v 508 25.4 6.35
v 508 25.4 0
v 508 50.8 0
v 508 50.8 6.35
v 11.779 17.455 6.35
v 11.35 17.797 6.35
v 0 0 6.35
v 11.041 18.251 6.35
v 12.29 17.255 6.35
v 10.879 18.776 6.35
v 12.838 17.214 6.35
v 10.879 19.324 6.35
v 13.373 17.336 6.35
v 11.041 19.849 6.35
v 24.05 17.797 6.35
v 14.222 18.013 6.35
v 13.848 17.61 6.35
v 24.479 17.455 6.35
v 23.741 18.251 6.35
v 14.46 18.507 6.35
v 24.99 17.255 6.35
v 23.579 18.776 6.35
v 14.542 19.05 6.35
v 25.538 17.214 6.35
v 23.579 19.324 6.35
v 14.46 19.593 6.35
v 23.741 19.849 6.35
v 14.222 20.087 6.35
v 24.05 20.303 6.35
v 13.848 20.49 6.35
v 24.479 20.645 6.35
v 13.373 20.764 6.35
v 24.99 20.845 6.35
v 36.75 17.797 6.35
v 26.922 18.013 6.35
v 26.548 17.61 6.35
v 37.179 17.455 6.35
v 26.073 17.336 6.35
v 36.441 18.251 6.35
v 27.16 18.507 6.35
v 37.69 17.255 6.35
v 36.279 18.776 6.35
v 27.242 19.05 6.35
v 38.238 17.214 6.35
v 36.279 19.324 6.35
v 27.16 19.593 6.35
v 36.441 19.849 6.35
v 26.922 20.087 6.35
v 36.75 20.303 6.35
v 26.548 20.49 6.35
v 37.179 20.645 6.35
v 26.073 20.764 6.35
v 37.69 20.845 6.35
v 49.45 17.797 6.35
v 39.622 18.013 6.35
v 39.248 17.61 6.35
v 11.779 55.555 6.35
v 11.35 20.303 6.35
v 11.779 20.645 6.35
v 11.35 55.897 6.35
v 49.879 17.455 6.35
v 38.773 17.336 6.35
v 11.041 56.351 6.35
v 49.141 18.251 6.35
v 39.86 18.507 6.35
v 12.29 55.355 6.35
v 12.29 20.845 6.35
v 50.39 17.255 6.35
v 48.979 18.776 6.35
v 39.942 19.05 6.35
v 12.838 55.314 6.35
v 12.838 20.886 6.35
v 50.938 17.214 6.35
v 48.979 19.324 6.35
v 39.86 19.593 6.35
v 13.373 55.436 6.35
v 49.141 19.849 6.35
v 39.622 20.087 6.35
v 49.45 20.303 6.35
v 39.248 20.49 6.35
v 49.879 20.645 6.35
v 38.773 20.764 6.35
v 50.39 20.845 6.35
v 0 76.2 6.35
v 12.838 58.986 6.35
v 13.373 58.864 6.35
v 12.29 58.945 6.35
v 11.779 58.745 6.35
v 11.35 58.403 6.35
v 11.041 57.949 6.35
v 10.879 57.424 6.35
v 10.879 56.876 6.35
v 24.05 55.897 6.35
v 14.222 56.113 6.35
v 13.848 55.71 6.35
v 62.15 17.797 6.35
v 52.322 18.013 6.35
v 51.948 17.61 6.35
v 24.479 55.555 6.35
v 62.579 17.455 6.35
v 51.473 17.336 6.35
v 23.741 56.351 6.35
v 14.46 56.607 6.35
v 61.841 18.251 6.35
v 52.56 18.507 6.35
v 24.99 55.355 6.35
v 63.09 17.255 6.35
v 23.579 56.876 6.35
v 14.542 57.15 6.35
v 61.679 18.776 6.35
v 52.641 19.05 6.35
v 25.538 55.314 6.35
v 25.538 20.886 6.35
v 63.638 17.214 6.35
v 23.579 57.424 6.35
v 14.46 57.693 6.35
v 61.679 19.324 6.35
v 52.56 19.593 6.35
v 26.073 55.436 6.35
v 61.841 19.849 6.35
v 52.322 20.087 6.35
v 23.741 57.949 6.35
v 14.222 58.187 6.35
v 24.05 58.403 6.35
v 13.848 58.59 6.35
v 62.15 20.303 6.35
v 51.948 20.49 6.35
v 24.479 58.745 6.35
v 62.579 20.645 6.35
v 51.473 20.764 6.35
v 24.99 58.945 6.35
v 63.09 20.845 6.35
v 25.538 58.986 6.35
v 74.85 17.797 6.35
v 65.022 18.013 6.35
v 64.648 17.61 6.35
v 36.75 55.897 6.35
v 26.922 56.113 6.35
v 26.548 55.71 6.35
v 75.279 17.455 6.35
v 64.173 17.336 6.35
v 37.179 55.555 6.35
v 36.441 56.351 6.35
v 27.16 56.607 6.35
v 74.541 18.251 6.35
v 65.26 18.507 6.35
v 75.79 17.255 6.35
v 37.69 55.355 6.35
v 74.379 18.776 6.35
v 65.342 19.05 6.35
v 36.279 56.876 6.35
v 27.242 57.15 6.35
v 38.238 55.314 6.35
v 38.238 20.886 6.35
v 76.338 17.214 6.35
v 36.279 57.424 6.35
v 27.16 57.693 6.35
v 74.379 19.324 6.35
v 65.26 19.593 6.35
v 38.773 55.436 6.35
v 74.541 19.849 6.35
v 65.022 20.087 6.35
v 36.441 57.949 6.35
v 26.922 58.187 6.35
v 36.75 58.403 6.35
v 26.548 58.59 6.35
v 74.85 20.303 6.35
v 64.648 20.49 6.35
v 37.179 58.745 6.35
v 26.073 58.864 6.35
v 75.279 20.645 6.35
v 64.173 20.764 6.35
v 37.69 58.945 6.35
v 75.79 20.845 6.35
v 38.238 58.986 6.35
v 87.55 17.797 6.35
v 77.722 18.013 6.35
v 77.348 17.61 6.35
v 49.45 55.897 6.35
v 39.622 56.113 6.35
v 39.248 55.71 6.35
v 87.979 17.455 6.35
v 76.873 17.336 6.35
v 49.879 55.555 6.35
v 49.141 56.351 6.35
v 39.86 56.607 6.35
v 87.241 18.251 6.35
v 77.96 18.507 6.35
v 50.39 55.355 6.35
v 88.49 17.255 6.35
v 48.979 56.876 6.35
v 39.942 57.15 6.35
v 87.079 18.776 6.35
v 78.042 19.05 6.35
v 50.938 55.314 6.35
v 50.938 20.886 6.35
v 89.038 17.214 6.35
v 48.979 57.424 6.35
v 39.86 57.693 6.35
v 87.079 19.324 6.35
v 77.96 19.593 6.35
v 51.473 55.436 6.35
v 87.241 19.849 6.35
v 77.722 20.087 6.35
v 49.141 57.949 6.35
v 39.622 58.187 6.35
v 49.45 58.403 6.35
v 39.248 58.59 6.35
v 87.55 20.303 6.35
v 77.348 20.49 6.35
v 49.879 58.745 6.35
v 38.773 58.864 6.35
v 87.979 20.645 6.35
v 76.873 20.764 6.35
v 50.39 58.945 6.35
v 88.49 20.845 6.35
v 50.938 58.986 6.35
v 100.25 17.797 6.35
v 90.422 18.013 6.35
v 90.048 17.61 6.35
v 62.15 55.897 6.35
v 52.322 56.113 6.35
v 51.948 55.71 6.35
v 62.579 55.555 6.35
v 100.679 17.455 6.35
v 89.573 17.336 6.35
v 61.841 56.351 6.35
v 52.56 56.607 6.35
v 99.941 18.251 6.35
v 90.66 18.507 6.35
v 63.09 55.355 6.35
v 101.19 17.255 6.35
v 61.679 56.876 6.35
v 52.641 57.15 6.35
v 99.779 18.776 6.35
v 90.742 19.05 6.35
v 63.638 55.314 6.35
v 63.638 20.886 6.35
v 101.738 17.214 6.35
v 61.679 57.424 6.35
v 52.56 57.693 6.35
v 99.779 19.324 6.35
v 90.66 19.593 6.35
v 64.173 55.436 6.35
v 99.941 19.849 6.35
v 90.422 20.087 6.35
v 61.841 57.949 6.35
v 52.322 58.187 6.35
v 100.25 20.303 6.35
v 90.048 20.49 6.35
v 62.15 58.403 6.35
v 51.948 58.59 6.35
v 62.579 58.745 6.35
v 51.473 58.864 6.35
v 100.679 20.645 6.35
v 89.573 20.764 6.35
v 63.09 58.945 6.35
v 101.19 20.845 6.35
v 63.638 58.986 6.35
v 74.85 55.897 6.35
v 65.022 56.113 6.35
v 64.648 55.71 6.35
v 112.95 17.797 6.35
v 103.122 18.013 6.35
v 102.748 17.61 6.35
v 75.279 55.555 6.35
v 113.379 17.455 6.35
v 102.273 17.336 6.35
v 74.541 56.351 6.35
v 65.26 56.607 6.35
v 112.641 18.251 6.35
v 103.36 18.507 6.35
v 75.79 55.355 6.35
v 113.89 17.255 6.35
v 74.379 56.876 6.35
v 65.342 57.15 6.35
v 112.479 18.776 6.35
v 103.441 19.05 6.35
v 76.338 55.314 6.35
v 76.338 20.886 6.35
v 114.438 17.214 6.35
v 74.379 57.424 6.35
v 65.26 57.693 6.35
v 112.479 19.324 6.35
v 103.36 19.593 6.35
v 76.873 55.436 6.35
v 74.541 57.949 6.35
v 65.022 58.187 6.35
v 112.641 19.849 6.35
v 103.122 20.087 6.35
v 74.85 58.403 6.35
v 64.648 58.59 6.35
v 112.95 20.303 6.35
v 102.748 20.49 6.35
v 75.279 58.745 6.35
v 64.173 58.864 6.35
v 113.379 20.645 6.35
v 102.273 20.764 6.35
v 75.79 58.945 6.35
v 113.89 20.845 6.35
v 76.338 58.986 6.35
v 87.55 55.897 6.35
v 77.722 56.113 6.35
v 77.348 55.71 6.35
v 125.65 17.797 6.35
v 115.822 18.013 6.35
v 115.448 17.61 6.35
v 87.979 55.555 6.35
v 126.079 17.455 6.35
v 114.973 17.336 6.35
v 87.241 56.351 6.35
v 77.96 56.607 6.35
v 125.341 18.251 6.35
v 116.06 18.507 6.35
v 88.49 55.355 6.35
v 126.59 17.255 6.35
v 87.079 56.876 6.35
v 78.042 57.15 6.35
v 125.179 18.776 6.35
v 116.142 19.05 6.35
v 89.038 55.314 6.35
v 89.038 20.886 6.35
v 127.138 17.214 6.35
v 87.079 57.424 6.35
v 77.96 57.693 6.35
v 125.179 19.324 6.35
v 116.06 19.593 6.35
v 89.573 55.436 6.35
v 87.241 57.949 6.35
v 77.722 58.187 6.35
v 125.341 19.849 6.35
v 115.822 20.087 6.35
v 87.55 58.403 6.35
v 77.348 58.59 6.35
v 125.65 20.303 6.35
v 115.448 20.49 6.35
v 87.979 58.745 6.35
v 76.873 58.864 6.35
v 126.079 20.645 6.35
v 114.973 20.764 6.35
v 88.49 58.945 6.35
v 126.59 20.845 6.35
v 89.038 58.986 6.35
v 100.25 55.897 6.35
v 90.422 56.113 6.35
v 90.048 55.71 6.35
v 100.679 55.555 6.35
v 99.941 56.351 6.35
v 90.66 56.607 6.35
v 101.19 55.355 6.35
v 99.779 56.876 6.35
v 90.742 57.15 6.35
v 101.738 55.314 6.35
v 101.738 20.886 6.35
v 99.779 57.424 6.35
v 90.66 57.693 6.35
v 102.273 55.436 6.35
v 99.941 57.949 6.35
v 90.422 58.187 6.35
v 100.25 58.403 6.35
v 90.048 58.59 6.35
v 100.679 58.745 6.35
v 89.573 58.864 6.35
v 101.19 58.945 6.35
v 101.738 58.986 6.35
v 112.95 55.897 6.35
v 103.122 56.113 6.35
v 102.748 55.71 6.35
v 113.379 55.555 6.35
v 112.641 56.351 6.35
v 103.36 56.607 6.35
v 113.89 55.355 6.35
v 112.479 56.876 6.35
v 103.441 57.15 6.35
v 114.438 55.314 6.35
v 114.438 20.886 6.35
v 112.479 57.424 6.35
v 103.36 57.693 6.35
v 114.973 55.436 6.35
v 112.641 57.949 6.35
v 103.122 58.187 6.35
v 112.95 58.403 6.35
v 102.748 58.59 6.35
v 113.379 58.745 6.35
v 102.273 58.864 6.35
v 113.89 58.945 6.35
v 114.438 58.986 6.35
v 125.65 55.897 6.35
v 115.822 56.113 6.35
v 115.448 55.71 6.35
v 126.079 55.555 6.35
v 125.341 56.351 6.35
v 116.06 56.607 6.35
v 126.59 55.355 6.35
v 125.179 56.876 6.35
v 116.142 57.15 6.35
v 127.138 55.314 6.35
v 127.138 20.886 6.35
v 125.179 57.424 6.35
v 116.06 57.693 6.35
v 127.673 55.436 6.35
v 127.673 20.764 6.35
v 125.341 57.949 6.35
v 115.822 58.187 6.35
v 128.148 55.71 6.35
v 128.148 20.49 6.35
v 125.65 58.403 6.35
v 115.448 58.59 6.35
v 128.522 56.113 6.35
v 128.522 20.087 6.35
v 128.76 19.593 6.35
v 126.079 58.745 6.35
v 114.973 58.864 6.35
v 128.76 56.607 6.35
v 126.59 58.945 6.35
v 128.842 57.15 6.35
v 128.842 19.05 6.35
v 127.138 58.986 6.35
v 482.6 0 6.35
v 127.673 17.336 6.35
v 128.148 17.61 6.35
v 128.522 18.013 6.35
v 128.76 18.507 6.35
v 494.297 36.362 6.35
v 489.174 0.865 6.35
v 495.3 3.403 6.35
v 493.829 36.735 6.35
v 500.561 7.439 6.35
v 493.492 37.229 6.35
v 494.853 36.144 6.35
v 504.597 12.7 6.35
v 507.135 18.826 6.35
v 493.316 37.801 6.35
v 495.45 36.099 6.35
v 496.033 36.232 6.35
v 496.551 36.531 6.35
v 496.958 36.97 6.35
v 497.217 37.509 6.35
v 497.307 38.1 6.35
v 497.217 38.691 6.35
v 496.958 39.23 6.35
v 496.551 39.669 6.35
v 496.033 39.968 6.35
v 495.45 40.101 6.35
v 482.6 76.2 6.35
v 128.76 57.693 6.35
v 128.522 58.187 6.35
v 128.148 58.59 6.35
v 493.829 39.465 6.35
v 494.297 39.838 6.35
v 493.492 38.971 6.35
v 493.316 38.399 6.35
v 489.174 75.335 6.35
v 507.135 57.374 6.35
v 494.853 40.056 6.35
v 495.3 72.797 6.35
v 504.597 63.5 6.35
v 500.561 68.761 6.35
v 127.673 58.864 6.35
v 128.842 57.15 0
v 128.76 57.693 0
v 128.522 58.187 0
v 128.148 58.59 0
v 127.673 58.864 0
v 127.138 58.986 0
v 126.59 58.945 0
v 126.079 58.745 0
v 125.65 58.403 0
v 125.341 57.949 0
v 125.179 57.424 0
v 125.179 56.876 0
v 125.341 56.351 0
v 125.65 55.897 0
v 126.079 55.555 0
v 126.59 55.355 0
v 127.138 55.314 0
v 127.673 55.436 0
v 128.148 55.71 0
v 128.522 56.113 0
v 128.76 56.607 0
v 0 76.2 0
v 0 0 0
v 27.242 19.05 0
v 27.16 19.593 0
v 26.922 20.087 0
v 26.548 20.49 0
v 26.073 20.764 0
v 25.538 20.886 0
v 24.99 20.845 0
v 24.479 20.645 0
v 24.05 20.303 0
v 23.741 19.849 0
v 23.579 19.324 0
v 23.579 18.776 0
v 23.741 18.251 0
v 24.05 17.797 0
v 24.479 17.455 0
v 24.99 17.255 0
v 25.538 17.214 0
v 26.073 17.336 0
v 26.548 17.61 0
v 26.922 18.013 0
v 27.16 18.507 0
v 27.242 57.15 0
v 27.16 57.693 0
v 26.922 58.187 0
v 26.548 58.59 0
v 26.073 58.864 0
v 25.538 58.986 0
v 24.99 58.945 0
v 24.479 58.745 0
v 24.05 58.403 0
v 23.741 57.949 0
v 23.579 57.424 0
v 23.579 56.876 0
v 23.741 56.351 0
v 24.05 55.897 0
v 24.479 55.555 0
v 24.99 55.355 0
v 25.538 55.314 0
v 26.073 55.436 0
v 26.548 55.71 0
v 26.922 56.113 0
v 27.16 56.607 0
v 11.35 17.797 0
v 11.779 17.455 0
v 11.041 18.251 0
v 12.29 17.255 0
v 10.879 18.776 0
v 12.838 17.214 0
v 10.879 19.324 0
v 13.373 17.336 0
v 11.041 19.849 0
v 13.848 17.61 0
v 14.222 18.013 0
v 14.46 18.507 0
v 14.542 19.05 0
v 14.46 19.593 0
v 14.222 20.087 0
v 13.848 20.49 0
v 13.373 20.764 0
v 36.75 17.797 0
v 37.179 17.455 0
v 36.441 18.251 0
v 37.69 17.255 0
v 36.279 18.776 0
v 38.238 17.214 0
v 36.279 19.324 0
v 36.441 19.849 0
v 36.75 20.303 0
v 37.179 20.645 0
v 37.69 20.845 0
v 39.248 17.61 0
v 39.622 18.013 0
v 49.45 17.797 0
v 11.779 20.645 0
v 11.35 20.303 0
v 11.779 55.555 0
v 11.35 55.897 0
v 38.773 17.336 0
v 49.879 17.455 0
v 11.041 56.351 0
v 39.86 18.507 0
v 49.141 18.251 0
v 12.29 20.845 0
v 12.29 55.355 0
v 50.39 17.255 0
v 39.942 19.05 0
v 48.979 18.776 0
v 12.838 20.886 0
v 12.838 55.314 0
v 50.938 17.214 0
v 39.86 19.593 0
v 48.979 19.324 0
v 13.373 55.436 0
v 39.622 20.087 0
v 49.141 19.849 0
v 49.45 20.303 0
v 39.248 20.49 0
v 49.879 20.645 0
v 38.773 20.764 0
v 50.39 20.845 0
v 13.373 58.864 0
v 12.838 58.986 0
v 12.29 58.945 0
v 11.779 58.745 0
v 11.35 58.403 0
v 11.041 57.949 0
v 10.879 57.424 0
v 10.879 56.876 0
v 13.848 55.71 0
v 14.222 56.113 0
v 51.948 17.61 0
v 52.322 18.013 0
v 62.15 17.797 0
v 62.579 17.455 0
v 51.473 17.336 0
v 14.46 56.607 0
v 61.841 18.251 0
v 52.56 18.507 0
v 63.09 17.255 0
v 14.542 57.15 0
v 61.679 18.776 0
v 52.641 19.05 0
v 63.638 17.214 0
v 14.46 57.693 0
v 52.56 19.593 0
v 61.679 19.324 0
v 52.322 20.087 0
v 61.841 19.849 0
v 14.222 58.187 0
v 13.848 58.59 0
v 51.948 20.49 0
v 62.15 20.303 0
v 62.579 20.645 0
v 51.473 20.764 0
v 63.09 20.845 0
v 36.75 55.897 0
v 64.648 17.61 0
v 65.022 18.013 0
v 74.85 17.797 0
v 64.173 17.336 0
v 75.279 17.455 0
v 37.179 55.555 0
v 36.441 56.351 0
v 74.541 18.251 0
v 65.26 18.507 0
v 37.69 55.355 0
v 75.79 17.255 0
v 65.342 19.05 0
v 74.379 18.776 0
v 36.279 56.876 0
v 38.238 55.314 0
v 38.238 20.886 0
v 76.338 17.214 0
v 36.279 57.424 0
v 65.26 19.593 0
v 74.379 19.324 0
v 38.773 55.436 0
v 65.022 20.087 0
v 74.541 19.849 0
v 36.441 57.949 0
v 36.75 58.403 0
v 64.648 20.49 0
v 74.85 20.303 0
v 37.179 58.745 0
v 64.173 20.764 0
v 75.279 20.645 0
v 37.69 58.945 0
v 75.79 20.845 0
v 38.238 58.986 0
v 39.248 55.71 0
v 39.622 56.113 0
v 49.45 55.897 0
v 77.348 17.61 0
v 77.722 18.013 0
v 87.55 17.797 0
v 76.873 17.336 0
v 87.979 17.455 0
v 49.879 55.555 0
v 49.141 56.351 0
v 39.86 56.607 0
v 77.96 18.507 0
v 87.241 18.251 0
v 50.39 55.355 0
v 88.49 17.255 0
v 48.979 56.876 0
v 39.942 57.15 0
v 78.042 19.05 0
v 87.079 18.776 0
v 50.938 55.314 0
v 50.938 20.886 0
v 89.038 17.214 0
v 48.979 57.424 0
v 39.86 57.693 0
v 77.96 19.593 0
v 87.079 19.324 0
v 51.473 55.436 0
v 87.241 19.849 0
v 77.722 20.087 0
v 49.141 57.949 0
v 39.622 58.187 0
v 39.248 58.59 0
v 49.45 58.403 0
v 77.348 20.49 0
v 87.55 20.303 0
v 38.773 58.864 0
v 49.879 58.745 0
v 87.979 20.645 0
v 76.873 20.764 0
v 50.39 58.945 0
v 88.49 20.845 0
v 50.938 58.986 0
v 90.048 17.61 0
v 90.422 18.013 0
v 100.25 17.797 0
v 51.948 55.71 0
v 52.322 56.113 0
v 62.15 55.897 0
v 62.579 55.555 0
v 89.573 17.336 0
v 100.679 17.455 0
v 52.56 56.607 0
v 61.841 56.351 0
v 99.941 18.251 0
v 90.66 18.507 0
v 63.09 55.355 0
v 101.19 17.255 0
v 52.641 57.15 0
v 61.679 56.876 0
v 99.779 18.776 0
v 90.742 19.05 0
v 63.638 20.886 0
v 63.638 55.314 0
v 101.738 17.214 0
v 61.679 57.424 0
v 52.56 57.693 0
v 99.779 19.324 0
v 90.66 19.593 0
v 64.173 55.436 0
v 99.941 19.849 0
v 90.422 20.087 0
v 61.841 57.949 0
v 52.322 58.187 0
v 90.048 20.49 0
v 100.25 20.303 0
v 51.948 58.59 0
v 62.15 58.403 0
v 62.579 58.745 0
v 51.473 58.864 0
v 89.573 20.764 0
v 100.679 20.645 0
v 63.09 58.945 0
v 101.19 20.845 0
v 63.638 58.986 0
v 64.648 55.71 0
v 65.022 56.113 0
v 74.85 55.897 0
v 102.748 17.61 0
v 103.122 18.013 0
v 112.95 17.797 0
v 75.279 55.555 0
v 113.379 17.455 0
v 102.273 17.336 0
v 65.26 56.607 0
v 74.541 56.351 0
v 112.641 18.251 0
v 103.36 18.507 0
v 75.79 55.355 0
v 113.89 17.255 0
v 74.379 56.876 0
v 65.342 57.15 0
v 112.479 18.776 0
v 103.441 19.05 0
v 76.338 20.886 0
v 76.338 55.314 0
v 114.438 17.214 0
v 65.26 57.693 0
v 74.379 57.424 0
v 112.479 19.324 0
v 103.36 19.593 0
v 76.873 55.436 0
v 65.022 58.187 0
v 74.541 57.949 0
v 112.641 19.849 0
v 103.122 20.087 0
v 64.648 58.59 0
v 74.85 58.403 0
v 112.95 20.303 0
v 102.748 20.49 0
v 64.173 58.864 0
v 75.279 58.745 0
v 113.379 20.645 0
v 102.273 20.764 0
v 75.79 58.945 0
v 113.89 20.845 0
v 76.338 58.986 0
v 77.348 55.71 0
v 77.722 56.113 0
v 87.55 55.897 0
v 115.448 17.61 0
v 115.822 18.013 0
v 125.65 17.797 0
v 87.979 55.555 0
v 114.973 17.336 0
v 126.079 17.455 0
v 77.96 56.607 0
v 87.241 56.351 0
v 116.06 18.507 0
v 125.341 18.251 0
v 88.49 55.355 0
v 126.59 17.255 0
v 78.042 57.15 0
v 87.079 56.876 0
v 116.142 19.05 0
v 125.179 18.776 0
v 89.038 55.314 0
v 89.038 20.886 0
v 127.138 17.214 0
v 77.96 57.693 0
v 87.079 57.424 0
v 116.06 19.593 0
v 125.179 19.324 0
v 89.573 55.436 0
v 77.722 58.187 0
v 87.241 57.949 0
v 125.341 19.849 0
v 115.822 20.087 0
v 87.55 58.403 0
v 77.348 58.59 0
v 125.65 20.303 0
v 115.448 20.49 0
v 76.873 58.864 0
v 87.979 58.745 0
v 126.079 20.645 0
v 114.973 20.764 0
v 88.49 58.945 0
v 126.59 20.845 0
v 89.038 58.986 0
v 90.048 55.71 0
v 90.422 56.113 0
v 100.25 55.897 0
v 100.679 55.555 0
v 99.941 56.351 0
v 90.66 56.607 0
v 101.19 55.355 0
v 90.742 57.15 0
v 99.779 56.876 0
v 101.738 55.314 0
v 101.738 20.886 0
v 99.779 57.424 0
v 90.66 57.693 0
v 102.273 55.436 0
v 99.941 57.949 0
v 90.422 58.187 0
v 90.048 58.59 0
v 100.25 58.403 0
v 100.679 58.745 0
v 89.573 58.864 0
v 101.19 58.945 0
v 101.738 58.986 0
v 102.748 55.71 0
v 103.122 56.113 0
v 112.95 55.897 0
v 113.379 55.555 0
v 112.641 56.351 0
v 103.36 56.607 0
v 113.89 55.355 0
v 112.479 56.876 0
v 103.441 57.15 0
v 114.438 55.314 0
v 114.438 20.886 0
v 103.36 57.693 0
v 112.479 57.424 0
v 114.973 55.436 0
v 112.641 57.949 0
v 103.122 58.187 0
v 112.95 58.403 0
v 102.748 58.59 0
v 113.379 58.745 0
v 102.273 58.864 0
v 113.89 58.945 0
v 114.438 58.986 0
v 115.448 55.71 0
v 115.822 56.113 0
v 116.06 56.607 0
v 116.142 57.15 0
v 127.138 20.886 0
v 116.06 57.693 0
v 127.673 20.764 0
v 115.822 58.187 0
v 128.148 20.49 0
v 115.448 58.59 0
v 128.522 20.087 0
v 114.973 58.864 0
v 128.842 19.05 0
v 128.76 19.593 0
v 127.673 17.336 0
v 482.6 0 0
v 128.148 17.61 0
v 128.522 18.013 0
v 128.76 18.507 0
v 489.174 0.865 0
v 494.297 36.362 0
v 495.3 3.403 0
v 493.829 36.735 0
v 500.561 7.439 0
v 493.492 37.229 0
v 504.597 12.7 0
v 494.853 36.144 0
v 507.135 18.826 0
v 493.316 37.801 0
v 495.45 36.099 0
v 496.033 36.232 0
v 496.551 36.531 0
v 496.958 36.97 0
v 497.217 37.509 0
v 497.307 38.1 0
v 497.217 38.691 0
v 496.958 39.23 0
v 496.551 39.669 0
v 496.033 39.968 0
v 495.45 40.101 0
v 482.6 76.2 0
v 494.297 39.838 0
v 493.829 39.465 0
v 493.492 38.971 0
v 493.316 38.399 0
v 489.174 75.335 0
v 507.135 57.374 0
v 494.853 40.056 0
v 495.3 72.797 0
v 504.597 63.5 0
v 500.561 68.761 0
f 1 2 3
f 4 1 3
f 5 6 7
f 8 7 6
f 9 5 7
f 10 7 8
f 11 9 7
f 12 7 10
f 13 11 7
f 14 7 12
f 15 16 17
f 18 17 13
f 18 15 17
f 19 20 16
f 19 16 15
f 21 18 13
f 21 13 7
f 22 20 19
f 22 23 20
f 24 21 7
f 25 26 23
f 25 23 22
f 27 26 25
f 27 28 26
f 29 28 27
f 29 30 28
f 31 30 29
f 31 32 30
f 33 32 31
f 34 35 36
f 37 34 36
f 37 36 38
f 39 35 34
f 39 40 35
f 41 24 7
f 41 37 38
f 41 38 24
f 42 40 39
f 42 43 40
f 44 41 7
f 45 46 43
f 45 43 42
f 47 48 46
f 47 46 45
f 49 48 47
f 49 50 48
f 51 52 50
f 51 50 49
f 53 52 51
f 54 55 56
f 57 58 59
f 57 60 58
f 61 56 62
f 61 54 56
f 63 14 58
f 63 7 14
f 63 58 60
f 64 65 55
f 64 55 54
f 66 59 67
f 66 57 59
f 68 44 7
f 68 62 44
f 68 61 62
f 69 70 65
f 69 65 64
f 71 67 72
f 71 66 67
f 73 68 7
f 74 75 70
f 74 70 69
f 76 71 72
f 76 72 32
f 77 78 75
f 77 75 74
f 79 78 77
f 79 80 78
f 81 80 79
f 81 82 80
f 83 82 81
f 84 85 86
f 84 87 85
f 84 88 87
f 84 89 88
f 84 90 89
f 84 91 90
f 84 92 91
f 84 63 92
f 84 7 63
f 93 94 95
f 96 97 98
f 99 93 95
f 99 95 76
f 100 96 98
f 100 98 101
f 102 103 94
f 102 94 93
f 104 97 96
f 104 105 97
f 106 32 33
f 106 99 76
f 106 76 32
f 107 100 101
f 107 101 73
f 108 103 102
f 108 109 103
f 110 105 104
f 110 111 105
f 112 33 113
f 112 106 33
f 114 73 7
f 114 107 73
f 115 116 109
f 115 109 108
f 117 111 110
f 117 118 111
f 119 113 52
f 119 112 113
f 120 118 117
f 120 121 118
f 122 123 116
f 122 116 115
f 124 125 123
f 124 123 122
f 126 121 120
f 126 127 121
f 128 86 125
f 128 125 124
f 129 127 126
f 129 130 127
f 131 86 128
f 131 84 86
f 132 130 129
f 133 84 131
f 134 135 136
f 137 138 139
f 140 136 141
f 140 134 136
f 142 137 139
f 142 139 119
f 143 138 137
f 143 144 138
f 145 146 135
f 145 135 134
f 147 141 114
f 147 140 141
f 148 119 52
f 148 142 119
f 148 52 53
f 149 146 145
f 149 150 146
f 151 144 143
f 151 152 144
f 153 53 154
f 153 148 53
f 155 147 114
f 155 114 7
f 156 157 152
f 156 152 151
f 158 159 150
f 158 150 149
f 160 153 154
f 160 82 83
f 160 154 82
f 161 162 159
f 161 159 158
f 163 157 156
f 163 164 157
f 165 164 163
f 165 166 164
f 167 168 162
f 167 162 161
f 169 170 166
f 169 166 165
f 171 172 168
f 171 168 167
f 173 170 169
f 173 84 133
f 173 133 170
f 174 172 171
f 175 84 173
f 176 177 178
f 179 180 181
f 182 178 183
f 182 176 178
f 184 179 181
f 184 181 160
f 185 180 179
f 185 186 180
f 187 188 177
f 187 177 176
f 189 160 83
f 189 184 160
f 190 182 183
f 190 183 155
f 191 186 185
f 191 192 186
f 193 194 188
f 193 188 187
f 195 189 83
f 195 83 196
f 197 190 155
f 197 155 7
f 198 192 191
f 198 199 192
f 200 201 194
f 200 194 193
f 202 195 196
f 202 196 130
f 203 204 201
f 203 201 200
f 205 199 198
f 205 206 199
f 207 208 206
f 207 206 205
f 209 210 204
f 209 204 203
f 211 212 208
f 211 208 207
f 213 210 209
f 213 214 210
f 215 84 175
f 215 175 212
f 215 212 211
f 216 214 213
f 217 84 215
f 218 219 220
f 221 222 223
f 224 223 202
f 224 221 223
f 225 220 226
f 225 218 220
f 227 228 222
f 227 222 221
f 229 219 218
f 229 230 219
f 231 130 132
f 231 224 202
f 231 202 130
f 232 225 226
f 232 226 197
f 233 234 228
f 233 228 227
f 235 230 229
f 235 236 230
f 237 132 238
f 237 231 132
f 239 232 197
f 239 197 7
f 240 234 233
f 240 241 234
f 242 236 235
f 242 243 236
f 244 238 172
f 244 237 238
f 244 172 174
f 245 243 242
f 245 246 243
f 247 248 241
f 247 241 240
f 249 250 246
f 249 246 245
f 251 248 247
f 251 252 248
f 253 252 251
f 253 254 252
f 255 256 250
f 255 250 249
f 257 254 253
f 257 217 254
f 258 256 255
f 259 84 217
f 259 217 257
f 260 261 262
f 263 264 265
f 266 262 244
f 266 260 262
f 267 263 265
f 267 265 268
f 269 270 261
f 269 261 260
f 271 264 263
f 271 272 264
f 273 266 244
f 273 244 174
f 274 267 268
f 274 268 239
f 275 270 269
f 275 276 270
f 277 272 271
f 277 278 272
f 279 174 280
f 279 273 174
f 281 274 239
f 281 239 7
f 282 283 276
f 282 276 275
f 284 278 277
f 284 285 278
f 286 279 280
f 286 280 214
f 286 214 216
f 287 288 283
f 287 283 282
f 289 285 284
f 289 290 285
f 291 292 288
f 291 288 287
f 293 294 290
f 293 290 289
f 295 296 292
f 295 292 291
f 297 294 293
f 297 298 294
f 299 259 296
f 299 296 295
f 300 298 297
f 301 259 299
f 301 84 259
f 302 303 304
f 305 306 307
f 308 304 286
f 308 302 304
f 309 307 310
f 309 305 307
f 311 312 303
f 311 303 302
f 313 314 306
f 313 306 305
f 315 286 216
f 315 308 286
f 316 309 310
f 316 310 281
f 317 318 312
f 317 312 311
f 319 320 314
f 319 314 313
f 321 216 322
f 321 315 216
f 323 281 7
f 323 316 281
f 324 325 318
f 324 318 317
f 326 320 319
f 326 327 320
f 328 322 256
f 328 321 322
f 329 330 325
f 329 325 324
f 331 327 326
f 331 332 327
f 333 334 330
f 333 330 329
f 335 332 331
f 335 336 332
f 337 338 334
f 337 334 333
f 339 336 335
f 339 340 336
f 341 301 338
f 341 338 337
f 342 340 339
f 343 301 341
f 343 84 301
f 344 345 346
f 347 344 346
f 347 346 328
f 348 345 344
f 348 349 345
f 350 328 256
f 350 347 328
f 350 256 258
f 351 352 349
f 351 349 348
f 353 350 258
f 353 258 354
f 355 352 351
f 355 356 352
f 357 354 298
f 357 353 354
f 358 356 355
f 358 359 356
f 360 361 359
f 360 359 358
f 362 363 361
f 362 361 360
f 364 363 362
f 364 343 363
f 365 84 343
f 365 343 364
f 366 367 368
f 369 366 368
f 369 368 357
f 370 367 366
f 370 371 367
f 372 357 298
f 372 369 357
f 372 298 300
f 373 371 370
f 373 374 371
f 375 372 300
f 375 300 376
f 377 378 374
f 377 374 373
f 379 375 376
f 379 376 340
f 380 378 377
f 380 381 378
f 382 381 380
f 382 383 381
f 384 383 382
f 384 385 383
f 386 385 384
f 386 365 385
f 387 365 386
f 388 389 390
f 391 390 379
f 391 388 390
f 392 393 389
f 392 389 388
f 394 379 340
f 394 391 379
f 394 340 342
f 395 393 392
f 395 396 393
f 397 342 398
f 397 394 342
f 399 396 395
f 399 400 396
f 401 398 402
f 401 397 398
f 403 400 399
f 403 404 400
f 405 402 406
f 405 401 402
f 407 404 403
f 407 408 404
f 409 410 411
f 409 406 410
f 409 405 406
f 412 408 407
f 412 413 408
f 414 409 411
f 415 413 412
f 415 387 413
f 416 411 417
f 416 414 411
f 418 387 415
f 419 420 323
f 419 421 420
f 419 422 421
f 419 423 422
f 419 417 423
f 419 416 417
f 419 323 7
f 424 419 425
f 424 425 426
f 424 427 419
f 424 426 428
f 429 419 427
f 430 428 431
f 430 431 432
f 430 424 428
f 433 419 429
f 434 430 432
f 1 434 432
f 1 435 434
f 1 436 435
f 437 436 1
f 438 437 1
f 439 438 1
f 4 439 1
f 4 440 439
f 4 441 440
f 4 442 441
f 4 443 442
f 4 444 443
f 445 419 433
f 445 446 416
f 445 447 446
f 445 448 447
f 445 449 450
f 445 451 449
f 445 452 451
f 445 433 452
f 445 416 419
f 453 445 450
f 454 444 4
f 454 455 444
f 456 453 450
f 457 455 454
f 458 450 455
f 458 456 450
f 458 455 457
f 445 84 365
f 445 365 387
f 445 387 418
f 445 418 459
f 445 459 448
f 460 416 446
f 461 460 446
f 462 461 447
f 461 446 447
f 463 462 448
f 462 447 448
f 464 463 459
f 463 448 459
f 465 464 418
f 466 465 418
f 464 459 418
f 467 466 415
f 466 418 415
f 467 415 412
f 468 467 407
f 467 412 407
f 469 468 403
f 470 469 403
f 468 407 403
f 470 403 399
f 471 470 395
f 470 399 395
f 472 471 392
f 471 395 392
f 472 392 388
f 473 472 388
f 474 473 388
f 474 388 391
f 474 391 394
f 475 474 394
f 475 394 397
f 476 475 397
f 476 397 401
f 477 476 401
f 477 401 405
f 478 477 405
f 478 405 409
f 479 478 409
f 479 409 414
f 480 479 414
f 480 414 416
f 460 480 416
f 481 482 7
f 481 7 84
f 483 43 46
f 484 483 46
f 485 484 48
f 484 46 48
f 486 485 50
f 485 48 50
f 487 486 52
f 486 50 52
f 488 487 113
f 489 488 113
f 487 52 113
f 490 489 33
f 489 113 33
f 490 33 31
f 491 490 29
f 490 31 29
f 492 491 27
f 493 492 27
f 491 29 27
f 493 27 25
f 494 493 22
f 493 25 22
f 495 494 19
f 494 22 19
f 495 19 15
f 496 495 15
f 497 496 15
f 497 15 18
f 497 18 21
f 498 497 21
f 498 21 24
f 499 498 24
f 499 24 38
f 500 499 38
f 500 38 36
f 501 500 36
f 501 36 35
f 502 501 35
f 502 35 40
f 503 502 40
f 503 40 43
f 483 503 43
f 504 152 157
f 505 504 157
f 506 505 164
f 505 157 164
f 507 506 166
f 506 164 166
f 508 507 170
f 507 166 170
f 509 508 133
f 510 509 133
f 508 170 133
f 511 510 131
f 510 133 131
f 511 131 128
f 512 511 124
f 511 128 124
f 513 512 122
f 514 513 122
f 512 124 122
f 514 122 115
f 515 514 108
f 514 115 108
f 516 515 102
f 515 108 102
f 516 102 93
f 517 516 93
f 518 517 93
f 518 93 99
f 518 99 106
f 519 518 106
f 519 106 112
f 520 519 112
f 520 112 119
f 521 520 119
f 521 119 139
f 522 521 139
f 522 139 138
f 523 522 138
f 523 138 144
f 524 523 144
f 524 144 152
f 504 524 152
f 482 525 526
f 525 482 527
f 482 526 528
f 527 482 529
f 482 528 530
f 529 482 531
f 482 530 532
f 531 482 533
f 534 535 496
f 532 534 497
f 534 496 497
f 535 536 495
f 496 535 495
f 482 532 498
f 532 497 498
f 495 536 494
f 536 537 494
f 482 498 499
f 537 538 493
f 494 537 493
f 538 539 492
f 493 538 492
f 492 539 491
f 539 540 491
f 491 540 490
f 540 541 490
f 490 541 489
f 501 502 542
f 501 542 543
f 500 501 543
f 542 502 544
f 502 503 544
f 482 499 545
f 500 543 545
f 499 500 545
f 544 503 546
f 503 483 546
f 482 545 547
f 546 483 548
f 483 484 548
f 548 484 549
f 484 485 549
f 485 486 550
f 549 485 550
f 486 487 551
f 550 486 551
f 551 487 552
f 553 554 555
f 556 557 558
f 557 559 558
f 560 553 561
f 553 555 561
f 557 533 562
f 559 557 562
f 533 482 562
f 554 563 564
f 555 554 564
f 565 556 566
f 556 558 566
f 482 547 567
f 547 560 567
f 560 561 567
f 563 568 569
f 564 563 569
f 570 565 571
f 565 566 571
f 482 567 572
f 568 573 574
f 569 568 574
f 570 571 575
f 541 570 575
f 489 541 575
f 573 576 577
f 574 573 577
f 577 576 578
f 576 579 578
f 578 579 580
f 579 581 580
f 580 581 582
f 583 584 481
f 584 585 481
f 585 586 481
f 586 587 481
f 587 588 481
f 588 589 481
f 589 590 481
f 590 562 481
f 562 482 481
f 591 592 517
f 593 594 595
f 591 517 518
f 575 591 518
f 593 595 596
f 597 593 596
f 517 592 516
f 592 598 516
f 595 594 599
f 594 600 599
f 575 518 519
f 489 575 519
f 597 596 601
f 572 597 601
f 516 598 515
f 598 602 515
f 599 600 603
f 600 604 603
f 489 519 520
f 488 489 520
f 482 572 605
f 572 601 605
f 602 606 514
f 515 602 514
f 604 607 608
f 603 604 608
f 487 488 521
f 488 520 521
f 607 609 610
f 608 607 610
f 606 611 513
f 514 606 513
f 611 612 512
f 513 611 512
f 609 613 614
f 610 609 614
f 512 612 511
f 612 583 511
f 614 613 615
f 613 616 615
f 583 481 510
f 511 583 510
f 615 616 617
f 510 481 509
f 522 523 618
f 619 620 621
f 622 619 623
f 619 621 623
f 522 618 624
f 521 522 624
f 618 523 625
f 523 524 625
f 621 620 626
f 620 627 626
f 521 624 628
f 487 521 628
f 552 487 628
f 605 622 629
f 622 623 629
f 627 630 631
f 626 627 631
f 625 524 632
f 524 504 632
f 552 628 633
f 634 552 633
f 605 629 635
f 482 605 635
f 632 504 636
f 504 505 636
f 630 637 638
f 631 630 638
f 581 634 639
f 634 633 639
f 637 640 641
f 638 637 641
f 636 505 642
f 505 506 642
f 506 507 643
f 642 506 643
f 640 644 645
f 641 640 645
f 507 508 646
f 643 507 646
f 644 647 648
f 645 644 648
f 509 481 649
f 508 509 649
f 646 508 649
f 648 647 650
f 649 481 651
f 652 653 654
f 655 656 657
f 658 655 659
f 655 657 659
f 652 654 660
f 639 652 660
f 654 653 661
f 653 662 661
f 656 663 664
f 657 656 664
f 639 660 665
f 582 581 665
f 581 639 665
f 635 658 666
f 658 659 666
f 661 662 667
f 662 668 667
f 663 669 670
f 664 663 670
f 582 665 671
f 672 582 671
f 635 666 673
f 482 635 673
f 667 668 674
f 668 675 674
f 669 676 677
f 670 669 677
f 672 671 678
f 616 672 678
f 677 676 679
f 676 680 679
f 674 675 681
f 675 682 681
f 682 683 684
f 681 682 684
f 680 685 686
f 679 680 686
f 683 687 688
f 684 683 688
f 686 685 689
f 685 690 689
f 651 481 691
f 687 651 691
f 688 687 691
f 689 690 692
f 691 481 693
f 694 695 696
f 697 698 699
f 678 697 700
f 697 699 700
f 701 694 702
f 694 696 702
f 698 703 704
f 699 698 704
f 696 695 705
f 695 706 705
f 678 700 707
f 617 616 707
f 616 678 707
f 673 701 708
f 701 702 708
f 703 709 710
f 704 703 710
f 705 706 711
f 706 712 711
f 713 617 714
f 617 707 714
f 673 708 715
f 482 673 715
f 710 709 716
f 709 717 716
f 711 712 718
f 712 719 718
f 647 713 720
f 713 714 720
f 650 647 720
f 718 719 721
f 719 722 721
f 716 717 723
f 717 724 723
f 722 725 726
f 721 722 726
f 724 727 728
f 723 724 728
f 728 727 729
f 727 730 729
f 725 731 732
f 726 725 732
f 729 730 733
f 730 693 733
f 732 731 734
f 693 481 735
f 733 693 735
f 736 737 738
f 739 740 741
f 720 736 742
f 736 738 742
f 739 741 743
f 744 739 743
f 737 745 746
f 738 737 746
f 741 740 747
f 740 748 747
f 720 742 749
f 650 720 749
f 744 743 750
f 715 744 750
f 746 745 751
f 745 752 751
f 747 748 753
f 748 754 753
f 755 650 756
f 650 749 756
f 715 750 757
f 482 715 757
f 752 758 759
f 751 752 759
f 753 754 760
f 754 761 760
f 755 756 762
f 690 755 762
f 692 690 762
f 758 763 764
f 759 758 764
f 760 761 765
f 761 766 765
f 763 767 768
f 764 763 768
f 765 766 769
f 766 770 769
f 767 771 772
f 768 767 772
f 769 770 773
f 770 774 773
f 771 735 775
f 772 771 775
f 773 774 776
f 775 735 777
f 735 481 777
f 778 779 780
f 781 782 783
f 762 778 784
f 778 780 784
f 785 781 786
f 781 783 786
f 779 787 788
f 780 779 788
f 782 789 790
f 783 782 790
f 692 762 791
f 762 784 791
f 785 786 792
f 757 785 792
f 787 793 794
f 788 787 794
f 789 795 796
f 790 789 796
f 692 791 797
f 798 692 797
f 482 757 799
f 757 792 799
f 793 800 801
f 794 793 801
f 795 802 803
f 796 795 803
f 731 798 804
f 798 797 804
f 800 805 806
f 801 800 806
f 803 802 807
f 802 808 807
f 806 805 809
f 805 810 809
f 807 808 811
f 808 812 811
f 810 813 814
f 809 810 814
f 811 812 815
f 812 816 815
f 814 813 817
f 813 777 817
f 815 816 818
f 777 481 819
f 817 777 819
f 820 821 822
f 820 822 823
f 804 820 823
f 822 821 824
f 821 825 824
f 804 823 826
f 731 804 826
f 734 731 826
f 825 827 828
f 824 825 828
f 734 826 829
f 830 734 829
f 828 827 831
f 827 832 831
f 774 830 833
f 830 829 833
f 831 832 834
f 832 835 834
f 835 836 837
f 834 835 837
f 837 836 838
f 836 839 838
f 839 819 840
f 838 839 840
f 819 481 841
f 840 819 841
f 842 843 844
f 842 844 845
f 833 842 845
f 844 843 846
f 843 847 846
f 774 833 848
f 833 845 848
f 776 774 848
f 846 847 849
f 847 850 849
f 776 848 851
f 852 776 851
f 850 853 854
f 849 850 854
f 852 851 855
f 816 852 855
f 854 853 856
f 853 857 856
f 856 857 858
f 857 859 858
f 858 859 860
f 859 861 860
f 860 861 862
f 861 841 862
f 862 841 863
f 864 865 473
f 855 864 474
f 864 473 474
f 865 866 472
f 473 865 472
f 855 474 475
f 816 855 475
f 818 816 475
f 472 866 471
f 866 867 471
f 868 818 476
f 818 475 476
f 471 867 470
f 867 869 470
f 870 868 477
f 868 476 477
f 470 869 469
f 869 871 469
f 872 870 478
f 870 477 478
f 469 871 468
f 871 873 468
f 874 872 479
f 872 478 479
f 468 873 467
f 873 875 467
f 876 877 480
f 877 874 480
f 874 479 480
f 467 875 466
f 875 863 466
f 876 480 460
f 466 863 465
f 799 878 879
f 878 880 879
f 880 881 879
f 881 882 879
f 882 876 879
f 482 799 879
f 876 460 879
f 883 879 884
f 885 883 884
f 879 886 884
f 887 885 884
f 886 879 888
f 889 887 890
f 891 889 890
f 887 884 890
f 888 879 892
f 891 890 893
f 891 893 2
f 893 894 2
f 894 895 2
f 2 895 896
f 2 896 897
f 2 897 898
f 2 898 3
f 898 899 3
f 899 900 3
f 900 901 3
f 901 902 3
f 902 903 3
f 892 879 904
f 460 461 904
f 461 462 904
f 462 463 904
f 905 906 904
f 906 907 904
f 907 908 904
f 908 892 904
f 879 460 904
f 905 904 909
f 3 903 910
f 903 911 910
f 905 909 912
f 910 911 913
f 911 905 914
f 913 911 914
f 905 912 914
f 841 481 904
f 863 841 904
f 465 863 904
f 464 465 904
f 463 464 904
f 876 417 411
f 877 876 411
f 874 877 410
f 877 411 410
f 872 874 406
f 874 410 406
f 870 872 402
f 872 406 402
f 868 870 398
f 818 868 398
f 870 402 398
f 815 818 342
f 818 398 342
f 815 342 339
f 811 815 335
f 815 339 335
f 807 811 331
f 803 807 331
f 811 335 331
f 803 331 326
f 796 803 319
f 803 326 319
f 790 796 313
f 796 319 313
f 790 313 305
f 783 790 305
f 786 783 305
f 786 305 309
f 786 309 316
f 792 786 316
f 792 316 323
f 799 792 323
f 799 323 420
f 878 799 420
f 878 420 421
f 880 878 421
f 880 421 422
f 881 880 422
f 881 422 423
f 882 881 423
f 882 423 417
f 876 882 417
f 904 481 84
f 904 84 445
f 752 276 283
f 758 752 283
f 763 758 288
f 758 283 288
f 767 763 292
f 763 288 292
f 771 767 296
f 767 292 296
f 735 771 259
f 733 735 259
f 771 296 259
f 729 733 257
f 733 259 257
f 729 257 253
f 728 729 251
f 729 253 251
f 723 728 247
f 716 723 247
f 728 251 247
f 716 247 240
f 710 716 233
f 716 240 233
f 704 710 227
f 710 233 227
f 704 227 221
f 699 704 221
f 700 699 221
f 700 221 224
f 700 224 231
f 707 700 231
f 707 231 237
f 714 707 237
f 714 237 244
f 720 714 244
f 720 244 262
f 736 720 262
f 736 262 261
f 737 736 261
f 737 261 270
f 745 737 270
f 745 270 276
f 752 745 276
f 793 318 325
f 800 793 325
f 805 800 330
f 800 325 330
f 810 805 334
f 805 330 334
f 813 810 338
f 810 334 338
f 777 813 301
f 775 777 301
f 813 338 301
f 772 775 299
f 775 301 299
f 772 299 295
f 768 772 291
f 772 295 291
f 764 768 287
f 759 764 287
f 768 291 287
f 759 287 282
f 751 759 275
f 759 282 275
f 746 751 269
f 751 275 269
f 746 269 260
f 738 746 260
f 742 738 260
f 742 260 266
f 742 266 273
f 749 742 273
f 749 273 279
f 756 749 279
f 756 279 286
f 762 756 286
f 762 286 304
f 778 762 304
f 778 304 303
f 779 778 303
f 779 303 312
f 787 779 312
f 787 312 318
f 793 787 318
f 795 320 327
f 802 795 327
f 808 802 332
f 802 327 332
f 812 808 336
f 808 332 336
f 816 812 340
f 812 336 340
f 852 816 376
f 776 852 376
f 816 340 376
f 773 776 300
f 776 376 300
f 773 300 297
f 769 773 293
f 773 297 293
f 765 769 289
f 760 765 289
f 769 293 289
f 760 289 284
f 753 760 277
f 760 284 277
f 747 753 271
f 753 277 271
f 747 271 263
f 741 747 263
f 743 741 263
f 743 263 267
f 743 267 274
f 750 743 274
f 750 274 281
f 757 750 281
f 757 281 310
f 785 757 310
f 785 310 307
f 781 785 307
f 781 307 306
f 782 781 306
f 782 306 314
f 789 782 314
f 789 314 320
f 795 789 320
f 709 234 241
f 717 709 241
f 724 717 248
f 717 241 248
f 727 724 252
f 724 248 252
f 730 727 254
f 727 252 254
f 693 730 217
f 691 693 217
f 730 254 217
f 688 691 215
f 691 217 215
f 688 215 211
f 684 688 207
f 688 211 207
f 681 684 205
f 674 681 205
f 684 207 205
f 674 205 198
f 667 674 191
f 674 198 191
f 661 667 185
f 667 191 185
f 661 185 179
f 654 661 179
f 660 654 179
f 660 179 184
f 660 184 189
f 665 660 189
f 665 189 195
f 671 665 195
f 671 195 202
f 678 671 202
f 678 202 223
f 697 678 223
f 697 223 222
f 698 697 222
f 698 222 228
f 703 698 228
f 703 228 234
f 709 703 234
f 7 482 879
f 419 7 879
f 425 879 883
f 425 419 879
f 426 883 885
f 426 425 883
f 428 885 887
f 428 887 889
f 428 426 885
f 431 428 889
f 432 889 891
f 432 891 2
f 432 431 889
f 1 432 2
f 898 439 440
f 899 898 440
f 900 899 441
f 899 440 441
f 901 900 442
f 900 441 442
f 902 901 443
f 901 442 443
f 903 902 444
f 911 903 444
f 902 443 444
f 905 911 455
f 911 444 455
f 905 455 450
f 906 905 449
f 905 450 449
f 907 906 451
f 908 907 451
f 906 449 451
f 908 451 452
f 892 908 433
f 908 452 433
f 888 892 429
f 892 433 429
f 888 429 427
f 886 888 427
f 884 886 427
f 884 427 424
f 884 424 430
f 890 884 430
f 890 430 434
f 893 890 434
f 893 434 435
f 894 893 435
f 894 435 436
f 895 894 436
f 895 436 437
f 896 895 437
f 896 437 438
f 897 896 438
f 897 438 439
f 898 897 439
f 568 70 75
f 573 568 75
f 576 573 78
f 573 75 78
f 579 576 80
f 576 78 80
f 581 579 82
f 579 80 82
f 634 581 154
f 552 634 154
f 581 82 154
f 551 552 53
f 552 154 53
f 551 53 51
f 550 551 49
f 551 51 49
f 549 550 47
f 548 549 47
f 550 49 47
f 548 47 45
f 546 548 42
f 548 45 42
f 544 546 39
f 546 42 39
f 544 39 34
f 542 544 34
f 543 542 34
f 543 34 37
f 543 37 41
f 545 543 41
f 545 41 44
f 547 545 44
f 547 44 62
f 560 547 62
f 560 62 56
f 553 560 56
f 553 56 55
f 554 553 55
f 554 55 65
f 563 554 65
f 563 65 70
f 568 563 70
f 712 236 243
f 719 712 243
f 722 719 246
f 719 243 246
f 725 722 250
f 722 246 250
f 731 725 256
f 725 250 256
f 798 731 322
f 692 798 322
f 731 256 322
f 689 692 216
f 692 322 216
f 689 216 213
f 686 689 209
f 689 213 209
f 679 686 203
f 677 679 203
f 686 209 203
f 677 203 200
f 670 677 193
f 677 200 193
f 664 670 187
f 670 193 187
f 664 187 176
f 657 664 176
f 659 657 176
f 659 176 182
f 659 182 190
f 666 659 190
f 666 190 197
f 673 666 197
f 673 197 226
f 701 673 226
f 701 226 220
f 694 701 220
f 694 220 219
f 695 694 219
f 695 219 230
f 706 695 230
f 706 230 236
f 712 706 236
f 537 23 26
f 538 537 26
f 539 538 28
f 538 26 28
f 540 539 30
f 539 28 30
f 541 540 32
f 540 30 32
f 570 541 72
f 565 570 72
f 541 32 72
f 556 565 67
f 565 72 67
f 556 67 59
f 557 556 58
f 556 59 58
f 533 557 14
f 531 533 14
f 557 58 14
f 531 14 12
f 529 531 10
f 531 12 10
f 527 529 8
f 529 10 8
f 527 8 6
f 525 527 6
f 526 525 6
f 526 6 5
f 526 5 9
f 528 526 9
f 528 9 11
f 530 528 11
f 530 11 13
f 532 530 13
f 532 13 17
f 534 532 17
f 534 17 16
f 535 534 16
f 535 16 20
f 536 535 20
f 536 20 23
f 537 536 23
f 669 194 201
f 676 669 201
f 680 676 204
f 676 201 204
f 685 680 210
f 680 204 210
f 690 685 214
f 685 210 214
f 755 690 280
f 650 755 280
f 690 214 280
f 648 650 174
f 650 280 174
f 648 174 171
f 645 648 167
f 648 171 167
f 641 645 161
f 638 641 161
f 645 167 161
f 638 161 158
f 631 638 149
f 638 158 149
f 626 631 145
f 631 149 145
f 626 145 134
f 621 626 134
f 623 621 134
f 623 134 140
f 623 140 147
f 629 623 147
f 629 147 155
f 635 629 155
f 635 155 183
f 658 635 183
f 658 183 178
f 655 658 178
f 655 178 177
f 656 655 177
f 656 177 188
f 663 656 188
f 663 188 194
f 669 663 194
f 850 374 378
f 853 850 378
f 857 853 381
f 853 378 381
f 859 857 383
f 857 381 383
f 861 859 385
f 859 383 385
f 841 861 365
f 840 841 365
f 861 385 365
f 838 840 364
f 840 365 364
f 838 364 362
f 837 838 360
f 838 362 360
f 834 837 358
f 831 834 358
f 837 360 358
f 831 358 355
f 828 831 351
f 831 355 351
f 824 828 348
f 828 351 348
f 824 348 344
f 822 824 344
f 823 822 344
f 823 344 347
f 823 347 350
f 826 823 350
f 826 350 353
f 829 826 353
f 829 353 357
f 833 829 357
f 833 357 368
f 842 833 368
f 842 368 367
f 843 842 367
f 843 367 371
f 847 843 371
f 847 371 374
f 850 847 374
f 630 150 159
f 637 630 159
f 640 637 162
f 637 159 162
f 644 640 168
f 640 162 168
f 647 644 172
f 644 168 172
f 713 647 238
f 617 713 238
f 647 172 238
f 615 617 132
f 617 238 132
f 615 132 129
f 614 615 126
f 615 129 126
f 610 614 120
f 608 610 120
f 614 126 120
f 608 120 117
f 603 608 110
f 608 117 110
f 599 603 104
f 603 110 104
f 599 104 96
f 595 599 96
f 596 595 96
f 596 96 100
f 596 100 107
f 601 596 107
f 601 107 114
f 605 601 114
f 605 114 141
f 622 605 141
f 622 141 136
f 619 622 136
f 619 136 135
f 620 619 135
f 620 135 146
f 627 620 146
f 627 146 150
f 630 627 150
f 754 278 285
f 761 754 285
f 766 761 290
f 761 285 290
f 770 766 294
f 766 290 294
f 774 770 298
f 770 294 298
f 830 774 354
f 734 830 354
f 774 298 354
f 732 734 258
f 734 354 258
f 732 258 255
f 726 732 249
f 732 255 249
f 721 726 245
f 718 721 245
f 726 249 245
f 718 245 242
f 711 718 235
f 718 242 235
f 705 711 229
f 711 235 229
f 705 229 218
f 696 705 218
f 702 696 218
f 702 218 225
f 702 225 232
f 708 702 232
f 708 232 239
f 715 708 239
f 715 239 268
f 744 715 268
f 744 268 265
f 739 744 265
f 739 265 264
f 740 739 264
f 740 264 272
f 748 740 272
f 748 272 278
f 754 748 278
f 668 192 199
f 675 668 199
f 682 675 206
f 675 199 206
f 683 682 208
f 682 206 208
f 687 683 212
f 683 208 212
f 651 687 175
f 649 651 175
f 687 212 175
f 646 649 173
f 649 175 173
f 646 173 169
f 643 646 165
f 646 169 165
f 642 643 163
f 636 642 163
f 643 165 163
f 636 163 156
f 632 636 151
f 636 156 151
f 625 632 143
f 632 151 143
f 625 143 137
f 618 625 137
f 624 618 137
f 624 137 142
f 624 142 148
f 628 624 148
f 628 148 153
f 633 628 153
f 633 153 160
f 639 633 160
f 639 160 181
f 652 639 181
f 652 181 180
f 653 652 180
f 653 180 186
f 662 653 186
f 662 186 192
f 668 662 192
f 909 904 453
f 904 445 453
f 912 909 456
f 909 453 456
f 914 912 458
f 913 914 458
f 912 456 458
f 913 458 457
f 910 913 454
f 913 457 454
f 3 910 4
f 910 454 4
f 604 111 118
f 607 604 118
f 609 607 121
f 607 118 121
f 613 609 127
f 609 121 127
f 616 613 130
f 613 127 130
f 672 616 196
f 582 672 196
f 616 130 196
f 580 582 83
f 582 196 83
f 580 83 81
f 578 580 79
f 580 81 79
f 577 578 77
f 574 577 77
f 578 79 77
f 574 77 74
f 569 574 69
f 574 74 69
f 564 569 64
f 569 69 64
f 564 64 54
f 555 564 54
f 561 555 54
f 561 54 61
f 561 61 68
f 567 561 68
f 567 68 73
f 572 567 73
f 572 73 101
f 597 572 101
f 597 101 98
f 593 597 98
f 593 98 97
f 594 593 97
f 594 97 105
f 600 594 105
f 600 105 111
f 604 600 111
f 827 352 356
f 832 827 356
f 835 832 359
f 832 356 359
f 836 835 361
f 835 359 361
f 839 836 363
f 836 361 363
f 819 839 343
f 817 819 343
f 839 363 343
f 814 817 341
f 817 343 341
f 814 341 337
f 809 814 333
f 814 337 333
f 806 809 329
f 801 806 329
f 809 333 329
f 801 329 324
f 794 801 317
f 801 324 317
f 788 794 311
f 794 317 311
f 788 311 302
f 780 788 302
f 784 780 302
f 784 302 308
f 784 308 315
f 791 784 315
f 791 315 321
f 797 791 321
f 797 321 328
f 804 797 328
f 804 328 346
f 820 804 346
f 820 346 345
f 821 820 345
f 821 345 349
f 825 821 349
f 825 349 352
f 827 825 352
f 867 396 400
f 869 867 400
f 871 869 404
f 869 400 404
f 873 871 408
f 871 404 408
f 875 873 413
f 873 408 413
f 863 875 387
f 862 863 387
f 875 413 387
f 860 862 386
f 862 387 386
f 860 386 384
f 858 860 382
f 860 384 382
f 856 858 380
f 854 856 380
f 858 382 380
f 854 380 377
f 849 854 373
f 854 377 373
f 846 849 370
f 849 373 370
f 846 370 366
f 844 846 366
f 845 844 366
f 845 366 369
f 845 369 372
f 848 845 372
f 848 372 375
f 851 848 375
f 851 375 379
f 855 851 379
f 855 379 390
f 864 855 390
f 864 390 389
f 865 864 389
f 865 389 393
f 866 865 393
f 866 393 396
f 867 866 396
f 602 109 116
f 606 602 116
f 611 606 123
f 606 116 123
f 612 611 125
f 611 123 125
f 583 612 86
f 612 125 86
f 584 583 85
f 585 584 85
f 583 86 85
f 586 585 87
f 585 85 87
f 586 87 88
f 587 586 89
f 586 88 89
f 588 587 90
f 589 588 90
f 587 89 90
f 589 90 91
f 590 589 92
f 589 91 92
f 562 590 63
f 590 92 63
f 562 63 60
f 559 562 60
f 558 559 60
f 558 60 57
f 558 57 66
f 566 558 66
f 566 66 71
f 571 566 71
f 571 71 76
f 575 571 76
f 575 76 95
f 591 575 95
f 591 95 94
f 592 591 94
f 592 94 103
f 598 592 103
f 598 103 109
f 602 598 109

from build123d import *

# Parameters (mm, degrees)
SKETCH1_W             = 508
SKETCH1_H             = 76.2
BASIC_PLANK_DEPTH     = 6.35
SKETCH2_R             = 1.8415
PLACEMENT_HOLES_DEPTH = 7.35
FILLET1_R             = 25.4
SKETCH3_R             = 2.0066
WHEEL_HOLE_DEPTH      = 7.35


with BuildPart() as part:
    # Sketch1 → basic_plank (new body)
    with BuildSketch(Plane.XY):
        with Locations((254, 38.1)):
            Rectangle(SKETCH1_W, SKETCH1_H)
    extrude(amount=BASIC_PLANK_DEPTH)

    # Sketch2 → placement holes (cut, through all)
    with BuildSketch(Plane.XY.offset(6.35)):
        with Locations((12.7, 57.15)):
            Circle(SKETCH2_R)
        with Locations((25.4, 57.15)):
            Circle(SKETCH2_R)
        with Locations((38.1, 57.15)):
            Circle(SKETCH2_R)
        with Locations((50.8, 57.15)):
            Circle(SKETCH2_R)
        with Locations((63.5, 57.15)):
            Circle(SKETCH2_R)
        with Locations((76.2, 57.15)):
            Circle(SKETCH2_R)
        with Locations((88.9, 57.15)):
            Circle(SKETCH2_R)
        with Locations((101.6, 57.15)):
            Circle(SKETCH2_R)
        with Locations((114.3, 57.15)):
            Circle(SKETCH2_R)
        with Locations((127, 57.15)):
            Circle(SKETCH2_R)
        with Locations((12.7, 19.05)):
            Circle(SKETCH2_R)
        with Locations((25.4, 19.05)):
            Circle(SKETCH2_R)
        with Locations((38.1, 19.05)):
            Circle(SKETCH2_R)
        with Locations((50.8, 19.05)):
            Circle(SKETCH2_R)
        with Locations((63.5, 19.05)):
            Circle(SKETCH2_R)
        with Locations((76.2, 19.05)):
            Circle(SKETCH2_R)
        with Locations((88.9, 19.05)):
            Circle(SKETCH2_R)
        with Locations((101.6, 19.05)):
            Circle(SKETCH2_R)
        with Locations((114.3, 19.05)):
            Circle(SKETCH2_R)
        with Locations((127, 19.05)):
            Circle(SKETCH2_R)
    extrude(amount=-PLACEMENT_HOLES_DEPTH, mode=Mode.SUBTRACT)

    # Fillet1
    fillet1_edges = [part.edges().sort_by_distance(p)[0] for p in [
        (508, 76.2, 3.175),
        (508, 0, 3.175),
    ]]
    fillet(fillet1_edges, radius=FILLET1_R)

    # Sketch3 → wheel_hole (cut, through all)
    with BuildSketch(Plane.XY.offset(6.35)):
        with Locations((495.3, 38.1)):
            Circle(SKETCH3_R)
    extrude(amount=-WHEEL_HOLE_DEPTH, mode=Mode.SUBTRACT)


solid = part.part
